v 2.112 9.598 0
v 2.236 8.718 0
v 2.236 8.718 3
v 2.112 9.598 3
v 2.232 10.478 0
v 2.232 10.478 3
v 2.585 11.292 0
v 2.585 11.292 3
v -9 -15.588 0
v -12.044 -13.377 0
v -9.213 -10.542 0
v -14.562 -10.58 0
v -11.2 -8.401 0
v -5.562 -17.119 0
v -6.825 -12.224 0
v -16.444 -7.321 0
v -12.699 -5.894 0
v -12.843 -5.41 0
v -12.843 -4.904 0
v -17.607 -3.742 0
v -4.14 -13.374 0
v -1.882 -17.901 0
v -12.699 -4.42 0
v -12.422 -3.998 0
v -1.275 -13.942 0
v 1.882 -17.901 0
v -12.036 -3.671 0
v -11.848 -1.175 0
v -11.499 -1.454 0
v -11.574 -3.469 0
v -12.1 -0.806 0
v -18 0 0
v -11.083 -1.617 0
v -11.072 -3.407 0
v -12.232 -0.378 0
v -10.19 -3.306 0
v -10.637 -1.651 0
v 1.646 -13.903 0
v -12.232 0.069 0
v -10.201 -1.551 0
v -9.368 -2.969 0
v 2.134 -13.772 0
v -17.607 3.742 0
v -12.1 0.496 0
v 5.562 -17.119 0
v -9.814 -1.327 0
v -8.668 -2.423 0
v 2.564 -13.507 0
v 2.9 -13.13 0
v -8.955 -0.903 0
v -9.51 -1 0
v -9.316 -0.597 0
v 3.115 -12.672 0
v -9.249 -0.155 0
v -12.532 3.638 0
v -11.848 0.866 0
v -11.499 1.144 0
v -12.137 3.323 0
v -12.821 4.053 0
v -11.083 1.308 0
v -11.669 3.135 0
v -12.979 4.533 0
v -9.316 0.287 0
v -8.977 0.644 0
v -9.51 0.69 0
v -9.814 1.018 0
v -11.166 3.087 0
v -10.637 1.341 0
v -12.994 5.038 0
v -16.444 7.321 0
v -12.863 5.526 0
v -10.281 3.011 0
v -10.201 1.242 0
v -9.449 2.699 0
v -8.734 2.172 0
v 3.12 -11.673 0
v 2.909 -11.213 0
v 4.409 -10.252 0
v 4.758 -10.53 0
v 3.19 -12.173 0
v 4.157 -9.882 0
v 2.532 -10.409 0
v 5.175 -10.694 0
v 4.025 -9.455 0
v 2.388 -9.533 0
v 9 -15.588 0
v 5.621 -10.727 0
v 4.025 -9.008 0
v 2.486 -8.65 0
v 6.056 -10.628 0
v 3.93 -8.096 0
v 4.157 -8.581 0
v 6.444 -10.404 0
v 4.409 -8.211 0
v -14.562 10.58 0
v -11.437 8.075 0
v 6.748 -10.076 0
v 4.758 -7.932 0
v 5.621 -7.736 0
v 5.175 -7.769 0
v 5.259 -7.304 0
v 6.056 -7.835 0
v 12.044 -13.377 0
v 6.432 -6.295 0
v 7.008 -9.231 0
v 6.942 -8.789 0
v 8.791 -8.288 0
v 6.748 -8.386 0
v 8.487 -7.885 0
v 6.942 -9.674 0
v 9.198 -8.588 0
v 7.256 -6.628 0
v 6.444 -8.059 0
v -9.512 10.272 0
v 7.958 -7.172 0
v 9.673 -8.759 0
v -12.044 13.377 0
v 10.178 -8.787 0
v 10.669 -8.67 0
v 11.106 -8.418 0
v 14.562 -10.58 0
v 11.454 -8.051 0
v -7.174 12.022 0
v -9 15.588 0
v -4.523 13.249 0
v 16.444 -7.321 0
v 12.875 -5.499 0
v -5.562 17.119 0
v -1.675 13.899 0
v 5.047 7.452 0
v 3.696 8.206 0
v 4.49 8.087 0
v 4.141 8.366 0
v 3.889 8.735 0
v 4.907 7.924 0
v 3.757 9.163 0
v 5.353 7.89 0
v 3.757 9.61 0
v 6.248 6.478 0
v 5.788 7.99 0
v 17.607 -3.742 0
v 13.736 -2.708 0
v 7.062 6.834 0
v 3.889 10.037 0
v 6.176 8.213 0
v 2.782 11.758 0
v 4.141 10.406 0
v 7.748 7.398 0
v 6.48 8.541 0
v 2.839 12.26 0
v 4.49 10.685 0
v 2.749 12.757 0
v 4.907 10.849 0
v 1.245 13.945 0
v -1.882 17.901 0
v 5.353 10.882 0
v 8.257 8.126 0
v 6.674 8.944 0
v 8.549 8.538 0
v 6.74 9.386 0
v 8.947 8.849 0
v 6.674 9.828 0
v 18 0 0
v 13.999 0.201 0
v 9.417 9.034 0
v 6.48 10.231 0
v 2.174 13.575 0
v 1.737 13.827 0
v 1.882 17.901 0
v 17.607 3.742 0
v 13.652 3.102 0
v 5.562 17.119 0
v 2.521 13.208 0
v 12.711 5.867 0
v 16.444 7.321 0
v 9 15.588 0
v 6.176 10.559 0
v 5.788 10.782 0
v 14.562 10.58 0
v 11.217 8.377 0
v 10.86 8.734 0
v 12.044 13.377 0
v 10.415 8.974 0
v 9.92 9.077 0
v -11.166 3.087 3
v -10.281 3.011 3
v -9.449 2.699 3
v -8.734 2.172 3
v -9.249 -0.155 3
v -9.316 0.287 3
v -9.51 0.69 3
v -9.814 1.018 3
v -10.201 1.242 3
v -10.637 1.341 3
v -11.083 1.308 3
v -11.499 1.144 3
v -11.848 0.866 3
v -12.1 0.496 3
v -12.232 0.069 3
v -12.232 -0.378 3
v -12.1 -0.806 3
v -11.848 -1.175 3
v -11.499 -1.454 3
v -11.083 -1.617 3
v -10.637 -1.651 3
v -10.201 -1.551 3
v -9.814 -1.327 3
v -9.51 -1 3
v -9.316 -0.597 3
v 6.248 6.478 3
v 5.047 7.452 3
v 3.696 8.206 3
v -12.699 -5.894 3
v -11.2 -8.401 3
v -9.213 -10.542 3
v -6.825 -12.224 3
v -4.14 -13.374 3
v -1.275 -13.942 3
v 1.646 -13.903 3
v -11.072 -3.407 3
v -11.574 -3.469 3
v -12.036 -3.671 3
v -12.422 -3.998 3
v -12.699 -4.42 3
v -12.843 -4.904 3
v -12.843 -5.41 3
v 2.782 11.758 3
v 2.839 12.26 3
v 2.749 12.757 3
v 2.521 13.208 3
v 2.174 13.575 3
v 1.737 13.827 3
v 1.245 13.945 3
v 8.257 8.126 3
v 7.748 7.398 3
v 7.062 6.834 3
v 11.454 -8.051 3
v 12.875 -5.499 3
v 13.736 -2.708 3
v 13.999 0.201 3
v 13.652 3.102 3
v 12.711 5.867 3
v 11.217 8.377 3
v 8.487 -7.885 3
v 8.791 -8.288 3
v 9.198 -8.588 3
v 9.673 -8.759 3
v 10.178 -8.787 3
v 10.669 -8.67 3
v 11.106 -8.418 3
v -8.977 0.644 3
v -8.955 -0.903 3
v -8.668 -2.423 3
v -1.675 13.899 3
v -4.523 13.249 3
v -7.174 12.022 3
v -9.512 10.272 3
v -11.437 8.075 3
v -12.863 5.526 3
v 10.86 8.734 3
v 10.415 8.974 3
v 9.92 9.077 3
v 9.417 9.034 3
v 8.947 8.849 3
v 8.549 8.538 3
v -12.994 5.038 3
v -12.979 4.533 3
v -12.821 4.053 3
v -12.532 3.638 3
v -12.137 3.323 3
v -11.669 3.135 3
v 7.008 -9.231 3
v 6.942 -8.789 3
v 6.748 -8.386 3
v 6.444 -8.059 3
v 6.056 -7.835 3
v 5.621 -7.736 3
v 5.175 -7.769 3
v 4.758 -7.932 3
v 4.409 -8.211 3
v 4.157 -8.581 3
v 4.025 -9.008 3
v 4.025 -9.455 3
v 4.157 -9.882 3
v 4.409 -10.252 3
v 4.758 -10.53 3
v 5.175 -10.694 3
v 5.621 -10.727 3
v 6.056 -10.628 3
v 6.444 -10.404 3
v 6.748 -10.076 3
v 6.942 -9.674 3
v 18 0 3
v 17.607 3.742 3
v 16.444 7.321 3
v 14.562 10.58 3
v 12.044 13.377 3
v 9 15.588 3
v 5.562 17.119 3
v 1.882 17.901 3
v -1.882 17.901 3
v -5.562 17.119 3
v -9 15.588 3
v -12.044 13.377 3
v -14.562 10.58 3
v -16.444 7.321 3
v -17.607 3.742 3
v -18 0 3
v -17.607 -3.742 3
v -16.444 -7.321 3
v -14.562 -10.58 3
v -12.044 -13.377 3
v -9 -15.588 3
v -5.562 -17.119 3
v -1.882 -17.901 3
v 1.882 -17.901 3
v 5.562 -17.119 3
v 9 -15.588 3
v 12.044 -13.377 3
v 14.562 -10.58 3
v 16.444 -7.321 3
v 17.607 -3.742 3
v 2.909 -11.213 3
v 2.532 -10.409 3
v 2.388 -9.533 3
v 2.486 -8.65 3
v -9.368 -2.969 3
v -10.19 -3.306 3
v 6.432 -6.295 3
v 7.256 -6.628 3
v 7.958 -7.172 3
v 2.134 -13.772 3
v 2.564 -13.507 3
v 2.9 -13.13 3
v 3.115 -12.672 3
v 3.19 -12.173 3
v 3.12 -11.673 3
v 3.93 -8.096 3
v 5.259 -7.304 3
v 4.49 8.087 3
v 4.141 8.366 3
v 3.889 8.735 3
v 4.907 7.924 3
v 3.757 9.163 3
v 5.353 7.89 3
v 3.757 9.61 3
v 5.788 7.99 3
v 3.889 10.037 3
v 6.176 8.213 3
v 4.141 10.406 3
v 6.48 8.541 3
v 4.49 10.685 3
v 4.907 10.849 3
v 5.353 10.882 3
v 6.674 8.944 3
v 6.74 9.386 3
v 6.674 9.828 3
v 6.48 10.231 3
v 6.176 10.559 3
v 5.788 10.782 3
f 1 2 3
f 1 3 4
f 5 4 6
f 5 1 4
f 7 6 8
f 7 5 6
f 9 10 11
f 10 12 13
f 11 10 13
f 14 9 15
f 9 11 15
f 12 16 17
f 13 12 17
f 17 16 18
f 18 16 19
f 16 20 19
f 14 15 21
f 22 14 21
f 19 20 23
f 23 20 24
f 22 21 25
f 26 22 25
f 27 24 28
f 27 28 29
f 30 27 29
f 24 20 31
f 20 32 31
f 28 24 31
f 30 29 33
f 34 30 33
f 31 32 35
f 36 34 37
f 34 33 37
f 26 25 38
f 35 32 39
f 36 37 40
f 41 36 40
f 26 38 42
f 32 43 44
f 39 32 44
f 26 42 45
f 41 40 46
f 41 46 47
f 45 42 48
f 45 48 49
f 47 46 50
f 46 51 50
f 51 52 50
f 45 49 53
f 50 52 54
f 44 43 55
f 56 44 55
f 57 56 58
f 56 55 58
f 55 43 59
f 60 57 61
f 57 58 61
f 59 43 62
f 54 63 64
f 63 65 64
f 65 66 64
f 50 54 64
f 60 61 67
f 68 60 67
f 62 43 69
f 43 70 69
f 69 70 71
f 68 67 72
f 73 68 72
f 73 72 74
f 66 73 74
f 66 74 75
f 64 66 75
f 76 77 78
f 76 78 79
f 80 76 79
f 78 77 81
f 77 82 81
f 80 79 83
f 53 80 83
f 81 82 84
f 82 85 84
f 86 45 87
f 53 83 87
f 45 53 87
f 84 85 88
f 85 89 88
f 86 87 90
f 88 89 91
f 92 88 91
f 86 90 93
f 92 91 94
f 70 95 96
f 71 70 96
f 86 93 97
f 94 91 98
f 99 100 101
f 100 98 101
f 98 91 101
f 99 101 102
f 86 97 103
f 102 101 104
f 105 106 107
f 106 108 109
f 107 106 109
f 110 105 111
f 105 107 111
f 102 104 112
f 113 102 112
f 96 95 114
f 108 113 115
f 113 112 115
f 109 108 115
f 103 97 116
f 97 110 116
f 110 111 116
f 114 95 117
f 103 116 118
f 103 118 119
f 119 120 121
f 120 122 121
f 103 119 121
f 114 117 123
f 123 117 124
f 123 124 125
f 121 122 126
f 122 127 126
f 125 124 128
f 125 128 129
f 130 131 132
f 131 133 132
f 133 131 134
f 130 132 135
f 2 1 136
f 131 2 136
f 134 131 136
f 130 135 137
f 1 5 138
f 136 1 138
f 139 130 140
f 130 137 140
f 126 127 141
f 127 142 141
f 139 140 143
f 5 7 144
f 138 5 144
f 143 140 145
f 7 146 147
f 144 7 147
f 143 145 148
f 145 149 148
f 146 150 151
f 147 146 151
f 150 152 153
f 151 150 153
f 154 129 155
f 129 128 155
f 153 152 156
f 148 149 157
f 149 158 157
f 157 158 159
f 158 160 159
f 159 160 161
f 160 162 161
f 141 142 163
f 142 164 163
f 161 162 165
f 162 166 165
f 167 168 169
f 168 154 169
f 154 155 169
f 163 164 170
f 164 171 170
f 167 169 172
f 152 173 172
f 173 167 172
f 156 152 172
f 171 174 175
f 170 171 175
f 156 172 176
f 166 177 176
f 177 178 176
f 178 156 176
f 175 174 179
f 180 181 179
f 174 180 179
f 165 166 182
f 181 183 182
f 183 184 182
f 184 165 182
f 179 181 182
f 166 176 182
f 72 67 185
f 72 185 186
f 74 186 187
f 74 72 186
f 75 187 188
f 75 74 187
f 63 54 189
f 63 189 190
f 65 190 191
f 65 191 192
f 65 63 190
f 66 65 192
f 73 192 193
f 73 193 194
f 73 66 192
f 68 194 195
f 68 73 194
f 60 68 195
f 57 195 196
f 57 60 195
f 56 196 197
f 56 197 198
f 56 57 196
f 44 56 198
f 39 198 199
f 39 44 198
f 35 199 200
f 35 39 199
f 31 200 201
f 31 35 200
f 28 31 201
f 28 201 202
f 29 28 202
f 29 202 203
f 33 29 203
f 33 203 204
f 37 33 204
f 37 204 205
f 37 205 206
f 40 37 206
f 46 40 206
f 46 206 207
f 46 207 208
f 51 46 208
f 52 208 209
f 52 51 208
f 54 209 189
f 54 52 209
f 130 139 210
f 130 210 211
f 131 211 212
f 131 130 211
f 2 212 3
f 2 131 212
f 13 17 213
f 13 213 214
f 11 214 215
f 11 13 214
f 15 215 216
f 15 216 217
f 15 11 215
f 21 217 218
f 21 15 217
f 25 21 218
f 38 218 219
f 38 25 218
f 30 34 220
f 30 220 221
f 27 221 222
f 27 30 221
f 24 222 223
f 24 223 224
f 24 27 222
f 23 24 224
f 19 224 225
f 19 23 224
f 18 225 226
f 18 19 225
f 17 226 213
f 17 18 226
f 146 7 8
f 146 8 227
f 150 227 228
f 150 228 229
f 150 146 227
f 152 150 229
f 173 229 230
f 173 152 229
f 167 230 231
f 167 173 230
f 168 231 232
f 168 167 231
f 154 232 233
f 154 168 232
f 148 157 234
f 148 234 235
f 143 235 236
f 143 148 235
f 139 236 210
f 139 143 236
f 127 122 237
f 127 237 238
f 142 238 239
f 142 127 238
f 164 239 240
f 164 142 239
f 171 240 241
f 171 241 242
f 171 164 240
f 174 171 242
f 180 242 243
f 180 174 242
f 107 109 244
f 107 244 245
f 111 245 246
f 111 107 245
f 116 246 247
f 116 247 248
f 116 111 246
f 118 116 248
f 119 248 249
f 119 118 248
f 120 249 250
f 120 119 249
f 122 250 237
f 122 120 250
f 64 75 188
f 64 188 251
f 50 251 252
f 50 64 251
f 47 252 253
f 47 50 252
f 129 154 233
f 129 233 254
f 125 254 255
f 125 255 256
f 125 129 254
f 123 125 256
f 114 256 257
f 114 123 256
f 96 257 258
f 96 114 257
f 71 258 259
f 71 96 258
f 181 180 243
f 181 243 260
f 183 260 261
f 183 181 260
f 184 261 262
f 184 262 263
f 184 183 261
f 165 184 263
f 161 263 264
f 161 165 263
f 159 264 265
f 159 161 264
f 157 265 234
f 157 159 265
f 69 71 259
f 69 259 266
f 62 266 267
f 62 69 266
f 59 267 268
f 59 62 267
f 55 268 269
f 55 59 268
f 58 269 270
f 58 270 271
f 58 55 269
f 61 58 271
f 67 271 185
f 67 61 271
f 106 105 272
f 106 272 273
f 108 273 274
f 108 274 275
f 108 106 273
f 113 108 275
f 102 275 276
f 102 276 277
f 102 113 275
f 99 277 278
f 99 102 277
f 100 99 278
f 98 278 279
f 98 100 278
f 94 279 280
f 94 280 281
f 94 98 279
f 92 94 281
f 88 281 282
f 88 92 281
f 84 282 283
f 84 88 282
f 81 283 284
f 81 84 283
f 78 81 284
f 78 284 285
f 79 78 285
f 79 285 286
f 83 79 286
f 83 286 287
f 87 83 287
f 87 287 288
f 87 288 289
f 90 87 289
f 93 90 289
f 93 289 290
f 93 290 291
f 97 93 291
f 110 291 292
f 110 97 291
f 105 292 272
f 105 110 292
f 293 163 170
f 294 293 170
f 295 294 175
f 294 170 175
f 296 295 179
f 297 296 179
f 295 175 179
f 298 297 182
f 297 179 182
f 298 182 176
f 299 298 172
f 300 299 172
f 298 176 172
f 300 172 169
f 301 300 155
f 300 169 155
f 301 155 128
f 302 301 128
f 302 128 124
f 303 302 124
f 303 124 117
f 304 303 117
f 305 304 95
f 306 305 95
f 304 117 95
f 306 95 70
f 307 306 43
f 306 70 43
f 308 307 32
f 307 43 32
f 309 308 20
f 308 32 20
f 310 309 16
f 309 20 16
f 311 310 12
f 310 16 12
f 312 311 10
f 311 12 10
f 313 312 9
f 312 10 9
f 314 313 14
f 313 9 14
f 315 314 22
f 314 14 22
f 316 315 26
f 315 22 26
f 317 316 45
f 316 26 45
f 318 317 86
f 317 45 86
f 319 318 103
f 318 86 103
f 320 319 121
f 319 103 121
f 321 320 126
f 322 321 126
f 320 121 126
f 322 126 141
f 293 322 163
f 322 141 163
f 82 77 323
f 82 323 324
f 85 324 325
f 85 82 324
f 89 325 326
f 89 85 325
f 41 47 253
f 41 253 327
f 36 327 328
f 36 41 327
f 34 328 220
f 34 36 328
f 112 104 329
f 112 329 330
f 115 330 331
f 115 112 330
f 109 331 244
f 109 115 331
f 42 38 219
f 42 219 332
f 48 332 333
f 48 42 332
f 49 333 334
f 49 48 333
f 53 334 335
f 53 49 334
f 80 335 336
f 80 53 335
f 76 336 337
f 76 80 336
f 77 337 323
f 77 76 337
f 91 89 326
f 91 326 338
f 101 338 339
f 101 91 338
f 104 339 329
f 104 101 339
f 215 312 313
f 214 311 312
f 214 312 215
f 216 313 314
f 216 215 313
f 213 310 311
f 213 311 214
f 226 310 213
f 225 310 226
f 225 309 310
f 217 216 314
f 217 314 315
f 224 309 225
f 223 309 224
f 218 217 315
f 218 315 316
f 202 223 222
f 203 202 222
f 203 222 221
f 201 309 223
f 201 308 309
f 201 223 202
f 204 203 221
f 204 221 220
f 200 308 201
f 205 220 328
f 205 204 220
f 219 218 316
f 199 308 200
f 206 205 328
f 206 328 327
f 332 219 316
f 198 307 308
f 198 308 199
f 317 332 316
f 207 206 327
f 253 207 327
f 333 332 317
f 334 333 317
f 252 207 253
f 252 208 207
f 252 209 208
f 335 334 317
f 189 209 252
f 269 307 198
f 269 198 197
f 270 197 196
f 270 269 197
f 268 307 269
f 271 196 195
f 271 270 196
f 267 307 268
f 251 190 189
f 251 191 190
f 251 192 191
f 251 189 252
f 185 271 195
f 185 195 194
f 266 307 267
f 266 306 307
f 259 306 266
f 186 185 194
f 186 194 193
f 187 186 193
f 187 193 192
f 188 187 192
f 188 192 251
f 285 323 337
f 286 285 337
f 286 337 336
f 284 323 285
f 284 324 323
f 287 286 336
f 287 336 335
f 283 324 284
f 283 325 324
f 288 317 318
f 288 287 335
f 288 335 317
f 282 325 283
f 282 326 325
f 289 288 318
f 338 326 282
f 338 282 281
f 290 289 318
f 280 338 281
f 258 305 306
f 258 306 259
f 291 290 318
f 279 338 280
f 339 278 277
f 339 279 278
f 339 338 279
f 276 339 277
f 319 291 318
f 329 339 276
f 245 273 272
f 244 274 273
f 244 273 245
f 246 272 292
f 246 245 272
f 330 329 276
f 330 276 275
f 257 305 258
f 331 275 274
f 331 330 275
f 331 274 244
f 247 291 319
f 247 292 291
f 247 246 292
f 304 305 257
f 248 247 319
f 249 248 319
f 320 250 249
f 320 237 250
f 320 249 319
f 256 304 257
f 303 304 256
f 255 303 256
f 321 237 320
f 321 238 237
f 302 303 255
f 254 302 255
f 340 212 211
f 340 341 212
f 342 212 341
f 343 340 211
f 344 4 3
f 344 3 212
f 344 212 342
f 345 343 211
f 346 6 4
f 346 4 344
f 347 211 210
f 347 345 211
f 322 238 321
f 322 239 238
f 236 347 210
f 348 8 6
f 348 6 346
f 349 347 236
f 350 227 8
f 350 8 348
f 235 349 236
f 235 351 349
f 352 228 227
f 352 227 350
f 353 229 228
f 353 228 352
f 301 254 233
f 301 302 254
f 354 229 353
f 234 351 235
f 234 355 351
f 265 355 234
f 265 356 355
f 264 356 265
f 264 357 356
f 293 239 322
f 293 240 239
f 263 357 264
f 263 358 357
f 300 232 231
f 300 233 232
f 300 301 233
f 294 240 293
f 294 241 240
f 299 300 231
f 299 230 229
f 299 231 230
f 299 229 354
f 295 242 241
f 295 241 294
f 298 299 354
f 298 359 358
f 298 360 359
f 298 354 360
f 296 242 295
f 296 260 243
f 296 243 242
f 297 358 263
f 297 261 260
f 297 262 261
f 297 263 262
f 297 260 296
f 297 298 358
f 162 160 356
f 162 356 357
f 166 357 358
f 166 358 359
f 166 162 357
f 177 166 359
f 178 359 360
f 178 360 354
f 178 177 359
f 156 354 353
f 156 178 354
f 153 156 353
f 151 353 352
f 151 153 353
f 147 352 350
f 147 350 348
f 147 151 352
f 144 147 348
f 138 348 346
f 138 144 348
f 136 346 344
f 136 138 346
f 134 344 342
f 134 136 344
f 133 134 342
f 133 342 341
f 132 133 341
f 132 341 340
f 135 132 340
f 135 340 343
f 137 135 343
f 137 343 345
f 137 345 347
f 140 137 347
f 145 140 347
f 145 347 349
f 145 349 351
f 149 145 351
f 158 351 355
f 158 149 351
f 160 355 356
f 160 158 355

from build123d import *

# Parameters (mm, degrees)
ESQUISSE1_R        = 18
ESQUISSE1_R_2      = 1.5
BOSS_EXTRU_1_DEPTH = 3


with BuildPart() as part:
    # Esquisse1 → Boss.-Extru.1 (new body)
    with BuildSketch(Plane.XY):
        Circle(ESQUISSE1_R)
        with Locations((5.240453276, 9.386167986)):
            Circle(ESQUISSE1_R_2, mode=Mode.SUBTRACT)
        with Locations((5.508433282, -9.231449657)):
            Circle(ESQUISSE1_R_2, mode=Mode.SUBTRACT)
        with Locations((-10.748886558, -0.154718329)):
            Circle(ESQUISSE1_R_2, mode=Mode.SUBTRACT)
        with BuildLine():
            ThreePointArc((2.485564989, -8.649969172), (4.611711585, -7.728655527), (6.432157603, -6.295025701))
            ThreePointArc((6.432157603, -6.295025701), (7.625396258, -6.875738378), (8.487039823, -7.88500349))
            ThreePointArc((8.487039823, -7.88500349), (9.92431211, -8.79166991), (11.453630047, -8.050736534))
            ThreePointArc((11.453630047, -8.050736534), (13.998549936, 0.201493638), (11.217170127, 8.377057619))
            ThreePointArc((11.217170127, 8.377057619), (9.667160345, 9.073667479), (8.256579008, 8.126009358))
            ThreePointArc((8.256579008, 8.126009358), (7.424340898, 7.092362693), (6.248310551, 6.47754701))
            ThreePointArc((6.248310551, 6.47754701), (4.387356231, 7.858187151), (2.235573373, 8.717924736))
            ThreePointArc((2.235573373, 8.717924736), (2.141865976, 10.041656062), (2.58509342, 11.292493835))
            ThreePointArc((2.58509342, 11.292493835), (2.651653429, 12.990541357), (1.245327334, 13.944502853))
            ThreePointArc((1.245327334, 13.944502853), (-7.173773577, 12.022353042), (-12.86332977, 5.525825479))
            ThreePointArc((-12.86332977, 5.525825479), (-12.691606715, 3.835172702), (-11.165620039, 3.087402491))
            ThreePointArc((-11.165620039, 3.087402491), (-9.854336713, 2.883486477), (-8.73387554, 2.172422163))
            ThreePointArc((-8.73387554, 2.172422163), (-8.999067816, -0.129531624), (-8.667730976, -2.422899035))
            ThreePointArc((-8.667730976, -2.422899035), (-9.767262234, -3.165917684), (-11.072133243, -3.407490345))
            ThreePointArc((-11.072133243, -3.407490345), (-12.575965538, -4.198871447), (-12.698957381, -5.893766319))
            ThreePointArc((-12.698957381, -5.893766319), (-6.824776359, -12.22384668), (1.646159643, -13.902883098))
            ThreePointArc((1.646159643, -13.902883098), (3.02444637, -12.90884018), (2.909041031, -11.213411848))
            ThreePointArc((2.909041031, -11.213411848), (2.429995816, -9.97584917), (2.485564989, -8.649969172))
        make_face(mode=Mode.SUBTRACT)
    extrude(amount=BOSS_EXTRU_1_DEPTH)


solid = part.part
